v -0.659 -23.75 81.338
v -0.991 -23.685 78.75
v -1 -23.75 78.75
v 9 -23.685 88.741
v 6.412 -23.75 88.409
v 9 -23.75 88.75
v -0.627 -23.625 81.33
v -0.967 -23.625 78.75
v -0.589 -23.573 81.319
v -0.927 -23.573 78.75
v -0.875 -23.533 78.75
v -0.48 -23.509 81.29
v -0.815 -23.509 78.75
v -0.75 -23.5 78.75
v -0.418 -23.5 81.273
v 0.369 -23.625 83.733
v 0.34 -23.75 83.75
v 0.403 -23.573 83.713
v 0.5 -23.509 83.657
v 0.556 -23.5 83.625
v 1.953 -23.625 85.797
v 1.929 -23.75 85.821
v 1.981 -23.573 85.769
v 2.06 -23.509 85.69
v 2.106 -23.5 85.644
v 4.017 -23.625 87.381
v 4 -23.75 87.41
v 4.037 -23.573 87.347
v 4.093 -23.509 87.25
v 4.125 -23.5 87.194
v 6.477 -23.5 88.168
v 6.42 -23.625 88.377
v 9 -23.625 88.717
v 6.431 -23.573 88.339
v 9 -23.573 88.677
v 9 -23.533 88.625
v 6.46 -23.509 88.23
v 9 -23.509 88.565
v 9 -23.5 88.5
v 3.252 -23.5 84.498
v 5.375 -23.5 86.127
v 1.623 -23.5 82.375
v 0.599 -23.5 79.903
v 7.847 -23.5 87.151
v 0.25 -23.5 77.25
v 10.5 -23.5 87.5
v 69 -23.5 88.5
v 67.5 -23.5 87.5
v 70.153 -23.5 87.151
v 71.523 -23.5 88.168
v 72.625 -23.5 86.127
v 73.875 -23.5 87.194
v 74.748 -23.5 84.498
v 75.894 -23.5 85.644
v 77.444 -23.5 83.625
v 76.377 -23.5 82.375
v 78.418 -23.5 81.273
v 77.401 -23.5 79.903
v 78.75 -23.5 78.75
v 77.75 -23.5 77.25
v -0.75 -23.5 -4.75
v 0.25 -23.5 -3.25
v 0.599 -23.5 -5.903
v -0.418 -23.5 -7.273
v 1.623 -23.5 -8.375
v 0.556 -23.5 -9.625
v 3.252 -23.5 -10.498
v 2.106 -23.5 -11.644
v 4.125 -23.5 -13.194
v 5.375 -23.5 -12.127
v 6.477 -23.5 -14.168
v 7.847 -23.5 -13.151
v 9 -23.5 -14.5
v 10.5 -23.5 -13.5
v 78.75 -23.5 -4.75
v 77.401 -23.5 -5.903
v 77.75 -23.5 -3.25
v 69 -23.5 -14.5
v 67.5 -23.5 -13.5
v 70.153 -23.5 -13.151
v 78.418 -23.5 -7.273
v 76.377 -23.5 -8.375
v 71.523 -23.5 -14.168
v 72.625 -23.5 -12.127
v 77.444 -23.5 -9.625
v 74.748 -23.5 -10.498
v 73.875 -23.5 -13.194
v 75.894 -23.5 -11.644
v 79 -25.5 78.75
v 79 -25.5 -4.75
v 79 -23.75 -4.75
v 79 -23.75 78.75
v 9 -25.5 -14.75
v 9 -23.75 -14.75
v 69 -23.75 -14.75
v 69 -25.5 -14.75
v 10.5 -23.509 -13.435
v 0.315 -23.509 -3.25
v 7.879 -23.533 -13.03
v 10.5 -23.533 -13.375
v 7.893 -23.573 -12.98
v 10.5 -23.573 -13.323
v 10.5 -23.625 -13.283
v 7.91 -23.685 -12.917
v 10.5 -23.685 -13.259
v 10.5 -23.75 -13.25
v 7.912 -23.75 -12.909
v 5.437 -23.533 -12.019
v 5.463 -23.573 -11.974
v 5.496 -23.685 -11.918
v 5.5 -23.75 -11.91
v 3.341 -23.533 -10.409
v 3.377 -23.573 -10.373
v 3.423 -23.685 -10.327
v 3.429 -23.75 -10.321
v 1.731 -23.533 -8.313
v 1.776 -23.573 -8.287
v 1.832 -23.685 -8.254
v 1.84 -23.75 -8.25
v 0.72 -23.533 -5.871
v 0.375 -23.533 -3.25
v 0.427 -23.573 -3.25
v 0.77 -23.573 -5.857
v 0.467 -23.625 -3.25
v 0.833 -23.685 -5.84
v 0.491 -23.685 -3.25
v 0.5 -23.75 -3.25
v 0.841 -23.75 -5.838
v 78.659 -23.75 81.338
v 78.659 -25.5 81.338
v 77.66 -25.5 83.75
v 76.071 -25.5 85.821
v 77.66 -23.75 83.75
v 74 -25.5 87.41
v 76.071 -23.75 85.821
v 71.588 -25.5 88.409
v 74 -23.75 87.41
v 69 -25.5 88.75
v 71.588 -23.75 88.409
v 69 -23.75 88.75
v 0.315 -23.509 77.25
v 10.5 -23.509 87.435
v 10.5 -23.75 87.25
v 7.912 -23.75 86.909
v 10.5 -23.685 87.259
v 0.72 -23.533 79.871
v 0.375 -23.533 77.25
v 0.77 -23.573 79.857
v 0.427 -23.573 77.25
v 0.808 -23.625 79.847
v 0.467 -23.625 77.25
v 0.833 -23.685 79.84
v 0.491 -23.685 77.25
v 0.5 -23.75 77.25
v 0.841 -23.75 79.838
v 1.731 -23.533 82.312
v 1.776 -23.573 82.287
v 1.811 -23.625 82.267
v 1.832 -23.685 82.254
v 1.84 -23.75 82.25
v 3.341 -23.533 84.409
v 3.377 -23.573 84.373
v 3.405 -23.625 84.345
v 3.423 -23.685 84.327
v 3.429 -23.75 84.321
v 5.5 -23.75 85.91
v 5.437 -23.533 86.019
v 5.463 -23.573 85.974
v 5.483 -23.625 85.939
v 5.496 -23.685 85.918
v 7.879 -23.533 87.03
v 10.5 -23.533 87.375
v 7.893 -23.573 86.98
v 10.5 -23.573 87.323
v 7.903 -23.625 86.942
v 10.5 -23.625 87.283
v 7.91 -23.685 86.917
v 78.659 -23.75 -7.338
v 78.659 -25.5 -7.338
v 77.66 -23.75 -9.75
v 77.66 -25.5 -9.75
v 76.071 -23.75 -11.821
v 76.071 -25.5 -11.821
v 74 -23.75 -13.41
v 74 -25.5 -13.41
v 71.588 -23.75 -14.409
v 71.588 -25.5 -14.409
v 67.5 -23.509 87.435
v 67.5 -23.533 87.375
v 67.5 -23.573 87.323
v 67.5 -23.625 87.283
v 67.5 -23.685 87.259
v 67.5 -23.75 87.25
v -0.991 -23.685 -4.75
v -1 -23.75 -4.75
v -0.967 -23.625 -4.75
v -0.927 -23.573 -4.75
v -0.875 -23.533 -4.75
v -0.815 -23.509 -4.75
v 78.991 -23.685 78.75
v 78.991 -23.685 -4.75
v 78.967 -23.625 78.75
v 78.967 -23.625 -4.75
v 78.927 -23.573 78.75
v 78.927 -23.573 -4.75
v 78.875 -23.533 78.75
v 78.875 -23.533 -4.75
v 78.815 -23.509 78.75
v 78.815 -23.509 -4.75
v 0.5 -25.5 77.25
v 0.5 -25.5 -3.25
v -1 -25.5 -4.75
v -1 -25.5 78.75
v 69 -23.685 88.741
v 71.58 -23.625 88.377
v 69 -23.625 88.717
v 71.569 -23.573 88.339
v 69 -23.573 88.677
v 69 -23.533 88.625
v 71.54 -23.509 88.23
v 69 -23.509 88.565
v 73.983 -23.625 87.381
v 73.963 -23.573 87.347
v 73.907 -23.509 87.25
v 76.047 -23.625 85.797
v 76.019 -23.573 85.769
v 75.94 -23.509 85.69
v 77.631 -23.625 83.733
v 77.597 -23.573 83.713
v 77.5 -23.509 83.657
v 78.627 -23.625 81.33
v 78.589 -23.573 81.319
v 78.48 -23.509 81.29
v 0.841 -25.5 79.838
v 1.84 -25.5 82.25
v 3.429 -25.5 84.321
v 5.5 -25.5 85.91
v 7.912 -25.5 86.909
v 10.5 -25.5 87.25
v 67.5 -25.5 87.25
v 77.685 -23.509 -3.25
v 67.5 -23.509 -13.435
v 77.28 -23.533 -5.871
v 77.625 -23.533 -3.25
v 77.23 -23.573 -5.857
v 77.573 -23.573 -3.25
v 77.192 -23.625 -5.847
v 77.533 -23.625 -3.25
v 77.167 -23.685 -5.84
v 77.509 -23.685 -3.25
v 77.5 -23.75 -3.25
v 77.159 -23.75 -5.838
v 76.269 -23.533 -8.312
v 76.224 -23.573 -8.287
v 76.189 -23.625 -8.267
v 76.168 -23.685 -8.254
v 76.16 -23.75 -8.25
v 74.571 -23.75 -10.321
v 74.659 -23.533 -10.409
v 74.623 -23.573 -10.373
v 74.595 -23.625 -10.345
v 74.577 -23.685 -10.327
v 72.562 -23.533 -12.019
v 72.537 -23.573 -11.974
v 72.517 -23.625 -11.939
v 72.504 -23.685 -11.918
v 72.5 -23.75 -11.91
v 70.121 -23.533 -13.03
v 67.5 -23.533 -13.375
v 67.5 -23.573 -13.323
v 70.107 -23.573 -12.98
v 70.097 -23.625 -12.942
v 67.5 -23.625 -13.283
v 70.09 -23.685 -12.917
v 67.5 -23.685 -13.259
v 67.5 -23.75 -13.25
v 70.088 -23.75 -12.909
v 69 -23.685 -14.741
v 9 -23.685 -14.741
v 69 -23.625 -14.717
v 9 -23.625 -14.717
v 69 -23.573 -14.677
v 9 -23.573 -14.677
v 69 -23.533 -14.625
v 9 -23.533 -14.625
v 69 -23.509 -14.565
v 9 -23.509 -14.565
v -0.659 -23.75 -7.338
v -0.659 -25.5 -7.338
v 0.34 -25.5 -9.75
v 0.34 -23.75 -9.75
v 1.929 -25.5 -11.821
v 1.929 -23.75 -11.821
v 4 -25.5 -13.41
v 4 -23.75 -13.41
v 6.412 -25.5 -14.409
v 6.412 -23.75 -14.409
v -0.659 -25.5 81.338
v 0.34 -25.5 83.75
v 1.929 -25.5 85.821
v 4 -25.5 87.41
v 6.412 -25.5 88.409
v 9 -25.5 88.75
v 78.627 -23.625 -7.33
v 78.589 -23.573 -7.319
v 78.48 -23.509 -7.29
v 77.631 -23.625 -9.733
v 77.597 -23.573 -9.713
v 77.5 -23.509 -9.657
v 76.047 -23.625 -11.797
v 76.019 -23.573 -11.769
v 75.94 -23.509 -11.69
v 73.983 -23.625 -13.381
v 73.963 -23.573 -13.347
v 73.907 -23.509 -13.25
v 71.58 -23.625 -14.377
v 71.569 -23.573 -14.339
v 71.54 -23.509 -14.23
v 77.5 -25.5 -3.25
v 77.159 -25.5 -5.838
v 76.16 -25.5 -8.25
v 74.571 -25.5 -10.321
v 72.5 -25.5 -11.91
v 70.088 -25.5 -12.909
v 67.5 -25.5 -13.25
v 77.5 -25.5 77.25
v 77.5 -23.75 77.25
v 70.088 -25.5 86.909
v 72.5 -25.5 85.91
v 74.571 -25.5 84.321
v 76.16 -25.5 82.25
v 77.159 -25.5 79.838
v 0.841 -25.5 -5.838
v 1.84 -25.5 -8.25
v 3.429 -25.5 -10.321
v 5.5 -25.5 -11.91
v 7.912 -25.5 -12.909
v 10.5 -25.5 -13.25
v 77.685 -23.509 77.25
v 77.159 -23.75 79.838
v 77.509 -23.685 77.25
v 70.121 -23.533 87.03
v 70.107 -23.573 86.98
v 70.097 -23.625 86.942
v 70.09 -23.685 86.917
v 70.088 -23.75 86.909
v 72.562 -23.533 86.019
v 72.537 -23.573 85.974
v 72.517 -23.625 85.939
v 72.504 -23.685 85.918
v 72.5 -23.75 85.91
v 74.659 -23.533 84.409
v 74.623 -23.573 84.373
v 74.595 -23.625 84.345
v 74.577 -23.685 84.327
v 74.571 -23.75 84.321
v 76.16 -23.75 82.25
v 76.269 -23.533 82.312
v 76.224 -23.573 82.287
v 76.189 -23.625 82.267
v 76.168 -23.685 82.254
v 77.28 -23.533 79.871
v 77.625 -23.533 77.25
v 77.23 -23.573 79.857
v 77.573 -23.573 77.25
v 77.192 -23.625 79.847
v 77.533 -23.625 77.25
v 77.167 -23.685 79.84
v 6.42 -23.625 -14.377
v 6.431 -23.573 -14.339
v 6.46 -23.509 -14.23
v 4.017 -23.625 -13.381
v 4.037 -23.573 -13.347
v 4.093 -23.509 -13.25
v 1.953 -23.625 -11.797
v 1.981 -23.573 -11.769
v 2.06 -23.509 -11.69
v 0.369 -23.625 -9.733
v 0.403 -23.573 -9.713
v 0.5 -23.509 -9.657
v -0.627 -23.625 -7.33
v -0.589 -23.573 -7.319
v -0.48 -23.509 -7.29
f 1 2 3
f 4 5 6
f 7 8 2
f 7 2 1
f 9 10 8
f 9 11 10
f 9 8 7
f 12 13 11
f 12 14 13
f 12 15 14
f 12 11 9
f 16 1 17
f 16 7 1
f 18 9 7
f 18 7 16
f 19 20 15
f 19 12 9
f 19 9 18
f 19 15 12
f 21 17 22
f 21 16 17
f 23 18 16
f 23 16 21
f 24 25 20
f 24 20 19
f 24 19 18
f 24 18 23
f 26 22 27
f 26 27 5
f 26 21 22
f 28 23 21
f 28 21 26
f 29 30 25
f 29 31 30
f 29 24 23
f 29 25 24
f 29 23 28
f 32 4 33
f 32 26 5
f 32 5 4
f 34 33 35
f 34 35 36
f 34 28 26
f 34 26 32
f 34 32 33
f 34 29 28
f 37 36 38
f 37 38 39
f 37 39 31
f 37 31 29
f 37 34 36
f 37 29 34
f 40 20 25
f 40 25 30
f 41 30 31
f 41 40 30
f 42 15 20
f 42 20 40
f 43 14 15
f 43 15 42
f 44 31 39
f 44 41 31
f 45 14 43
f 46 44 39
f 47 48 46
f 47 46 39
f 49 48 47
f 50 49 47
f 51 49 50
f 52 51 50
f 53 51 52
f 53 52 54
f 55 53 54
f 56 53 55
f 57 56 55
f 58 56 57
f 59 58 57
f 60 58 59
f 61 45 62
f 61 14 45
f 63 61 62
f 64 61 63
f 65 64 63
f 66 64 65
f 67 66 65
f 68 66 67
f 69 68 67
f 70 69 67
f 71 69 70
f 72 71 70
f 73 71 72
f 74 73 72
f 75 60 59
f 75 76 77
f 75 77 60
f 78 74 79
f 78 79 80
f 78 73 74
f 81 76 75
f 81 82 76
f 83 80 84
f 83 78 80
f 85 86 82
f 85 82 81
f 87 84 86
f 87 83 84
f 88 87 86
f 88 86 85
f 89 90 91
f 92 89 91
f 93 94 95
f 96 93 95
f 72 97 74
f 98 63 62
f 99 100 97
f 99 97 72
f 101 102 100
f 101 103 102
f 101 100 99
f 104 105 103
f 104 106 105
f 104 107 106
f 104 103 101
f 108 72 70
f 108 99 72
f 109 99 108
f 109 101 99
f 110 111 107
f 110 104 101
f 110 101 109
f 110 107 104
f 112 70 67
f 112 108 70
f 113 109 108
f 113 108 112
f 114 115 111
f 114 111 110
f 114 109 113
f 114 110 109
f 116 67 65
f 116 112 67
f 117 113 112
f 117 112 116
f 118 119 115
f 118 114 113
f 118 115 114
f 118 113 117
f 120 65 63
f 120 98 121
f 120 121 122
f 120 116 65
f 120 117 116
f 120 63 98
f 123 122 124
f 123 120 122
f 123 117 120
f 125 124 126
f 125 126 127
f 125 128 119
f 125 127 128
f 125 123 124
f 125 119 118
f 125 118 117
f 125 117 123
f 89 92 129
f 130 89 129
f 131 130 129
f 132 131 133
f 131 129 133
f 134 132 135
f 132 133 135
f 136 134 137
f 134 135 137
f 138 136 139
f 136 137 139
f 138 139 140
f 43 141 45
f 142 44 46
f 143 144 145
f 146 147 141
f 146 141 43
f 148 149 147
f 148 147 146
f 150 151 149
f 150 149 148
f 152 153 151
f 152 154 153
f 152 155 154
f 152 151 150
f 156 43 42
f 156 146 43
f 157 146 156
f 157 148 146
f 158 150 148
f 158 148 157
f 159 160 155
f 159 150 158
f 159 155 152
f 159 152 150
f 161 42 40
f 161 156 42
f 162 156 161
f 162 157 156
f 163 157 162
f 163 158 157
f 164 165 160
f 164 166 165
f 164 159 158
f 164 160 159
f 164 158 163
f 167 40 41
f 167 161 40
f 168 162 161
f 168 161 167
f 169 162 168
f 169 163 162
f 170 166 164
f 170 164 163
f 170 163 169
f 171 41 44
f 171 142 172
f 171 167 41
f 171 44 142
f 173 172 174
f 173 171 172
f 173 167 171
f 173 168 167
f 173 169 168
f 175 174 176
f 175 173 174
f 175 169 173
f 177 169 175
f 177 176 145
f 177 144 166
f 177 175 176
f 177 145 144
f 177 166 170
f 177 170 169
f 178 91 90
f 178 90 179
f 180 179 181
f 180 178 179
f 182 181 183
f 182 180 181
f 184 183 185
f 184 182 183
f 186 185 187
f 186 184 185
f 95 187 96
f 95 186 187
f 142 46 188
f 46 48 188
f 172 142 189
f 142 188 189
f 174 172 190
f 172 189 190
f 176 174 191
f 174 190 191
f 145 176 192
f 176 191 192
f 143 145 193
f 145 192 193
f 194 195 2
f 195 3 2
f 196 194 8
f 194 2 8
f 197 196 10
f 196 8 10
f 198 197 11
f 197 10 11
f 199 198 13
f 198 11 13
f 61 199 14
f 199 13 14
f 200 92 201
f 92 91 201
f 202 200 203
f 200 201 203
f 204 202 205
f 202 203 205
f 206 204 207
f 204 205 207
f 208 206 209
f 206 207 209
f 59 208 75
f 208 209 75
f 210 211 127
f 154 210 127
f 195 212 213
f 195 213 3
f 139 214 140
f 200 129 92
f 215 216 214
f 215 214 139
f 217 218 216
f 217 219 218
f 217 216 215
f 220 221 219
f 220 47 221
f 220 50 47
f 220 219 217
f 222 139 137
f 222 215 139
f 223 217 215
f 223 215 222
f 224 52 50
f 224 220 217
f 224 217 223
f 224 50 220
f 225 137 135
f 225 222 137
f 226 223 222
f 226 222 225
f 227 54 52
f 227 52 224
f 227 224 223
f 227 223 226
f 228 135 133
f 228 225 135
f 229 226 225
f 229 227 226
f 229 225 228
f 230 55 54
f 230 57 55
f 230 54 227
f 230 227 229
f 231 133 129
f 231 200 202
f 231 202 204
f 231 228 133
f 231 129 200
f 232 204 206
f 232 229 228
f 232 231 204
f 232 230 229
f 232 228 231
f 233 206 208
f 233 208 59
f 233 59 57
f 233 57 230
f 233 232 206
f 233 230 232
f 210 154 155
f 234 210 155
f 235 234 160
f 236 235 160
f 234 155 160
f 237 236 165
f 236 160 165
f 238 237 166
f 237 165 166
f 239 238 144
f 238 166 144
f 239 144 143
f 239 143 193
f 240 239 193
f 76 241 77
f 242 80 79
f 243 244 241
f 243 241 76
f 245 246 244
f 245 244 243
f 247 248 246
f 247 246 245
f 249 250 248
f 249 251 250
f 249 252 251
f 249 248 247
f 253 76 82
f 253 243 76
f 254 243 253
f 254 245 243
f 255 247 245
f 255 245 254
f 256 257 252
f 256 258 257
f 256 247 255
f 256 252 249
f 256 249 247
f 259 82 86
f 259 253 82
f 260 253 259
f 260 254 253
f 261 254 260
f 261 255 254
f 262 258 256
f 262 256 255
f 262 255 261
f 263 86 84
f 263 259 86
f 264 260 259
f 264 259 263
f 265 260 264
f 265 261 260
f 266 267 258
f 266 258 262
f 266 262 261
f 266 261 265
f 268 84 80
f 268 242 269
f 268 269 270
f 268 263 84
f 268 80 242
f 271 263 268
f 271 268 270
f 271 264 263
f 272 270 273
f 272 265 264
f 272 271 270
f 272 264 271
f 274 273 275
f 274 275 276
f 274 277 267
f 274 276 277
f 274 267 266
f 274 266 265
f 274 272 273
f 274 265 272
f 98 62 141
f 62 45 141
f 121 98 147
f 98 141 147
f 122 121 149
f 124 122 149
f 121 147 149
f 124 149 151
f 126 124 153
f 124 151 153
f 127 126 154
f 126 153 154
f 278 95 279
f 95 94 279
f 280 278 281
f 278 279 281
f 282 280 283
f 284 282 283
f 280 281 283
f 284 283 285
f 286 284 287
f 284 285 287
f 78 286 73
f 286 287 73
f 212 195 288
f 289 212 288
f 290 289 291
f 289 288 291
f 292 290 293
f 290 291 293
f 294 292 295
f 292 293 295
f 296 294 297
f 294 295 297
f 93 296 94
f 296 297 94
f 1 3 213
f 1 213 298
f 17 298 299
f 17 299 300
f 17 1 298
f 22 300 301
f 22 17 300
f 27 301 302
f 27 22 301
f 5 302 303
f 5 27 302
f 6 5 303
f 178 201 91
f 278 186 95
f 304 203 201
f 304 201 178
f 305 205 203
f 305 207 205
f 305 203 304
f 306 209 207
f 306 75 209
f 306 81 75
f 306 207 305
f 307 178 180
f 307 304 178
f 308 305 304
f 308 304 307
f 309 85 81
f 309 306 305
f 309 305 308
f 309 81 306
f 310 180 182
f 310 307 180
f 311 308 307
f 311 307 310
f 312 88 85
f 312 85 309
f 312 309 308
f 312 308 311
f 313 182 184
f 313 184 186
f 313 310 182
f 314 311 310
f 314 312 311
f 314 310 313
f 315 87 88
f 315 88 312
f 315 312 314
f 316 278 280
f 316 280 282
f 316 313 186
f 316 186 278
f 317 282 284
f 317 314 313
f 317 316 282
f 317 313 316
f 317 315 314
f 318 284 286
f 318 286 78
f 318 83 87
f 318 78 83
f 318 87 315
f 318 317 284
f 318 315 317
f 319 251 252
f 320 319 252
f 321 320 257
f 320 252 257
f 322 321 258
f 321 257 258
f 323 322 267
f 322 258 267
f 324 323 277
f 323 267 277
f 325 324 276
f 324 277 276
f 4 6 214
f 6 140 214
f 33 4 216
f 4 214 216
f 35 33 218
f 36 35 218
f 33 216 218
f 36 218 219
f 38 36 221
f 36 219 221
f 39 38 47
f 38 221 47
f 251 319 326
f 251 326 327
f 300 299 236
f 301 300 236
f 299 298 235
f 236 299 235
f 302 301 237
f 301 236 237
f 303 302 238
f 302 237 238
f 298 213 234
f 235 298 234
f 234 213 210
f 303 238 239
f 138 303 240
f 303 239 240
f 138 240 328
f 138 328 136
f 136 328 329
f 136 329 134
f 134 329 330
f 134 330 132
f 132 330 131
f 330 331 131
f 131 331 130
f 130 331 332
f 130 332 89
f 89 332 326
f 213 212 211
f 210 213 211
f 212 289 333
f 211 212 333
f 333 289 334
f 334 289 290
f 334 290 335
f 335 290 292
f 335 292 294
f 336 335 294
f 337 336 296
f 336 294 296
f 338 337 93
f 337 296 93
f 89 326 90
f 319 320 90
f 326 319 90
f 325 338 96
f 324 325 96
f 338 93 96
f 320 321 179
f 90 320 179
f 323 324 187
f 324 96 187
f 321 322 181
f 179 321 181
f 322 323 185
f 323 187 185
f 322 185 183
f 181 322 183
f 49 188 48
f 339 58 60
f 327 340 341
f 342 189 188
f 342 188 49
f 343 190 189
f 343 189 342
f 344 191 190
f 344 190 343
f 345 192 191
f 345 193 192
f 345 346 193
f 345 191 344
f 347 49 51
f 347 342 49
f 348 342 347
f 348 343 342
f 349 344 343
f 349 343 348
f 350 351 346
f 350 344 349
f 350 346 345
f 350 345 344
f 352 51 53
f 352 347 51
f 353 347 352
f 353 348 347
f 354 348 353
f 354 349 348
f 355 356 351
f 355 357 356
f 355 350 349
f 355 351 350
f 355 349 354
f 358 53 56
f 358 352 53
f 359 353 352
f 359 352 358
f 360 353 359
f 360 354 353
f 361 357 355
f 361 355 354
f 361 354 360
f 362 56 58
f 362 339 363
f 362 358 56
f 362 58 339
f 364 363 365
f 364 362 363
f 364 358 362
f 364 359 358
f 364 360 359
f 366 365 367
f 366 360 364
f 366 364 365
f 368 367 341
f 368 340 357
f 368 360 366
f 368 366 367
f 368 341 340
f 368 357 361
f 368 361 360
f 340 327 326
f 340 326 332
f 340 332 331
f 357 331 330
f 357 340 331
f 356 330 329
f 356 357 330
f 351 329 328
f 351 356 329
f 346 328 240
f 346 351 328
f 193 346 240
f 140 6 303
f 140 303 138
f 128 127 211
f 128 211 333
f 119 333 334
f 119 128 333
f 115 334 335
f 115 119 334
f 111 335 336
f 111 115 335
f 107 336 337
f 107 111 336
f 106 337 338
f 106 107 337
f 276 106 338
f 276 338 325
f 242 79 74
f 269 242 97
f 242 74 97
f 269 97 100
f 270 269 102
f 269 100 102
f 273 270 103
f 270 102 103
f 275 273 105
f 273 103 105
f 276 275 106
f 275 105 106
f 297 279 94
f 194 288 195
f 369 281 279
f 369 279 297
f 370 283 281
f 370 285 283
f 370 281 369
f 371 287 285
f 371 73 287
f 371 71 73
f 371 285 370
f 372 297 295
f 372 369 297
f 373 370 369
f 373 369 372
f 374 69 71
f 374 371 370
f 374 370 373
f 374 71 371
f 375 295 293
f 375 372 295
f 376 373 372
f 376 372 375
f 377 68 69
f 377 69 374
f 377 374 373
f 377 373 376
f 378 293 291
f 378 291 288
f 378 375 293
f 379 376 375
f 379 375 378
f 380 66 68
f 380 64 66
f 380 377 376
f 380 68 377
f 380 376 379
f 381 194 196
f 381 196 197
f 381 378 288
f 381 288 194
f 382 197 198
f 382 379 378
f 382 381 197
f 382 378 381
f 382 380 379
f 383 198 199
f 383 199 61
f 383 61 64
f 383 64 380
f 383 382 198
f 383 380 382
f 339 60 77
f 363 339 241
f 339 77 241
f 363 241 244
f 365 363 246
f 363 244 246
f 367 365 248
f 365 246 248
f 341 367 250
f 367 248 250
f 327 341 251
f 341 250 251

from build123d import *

# Parameters (mm, degrees)
BOX027_W     = 77
BOX027_H     = 2
BOX027_DEPTH = 100.5
FILLET031_R  = 10
BOX026_W     = 80
BOX026_H     = 2
BOX026_DEPTH = 103.5
FILLET030_R  = 10
FILLET032_R  = 0.25


with BuildPart() as topridge001:
    # Box027 → Box027 (new body)
    with BuildSketch(Plane(origin=(0.5, -26, -13.25), x_dir=(1, 0, 0), z_dir=(0, 0, 1))):
        with Locations((38.5, 1)):
            Rectangle(BOX027_W, BOX027_H)
    extrude(amount=BOX027_DEPTH)

    # Fillet031
    fillet031_edges = [topridge001.edges().sort_by_distance(p)[0] for p in [
        (0.5, -25, 87.25),
        (0.5, -25, -13.25),
        (77.5, -25, 87.25),
        (77.5, -25, -13.25),
    ]]
    fillet(fillet031_edges, radius=FILLET031_R)


with BuildPart() as topridge001_1:
    # Fillet031 placement: moved
    add(topridge001.part.moved(Location((0, 0.5, 0))))


with BuildPart() as ridge:
    # Box026 → Box026 (new body)
    with BuildSketch(Plane(origin=(-1, -26, -14.75), x_dir=(1, 0, 0), z_dir=(0, 0, 1))):
        with Locations((40, 1)):
            Rectangle(BOX026_W, BOX026_H)
    extrude(amount=BOX026_DEPTH)

    # Fillet030
    fillet030_edges = [ridge.edges().sort_by_distance(p)[0] for p in [
        (-1, -25, 88.75),
        (-1, -25, -14.75),
        (79, -25, 88.75),
        (79, -25, -14.75),
    ]]
    fillet(fillet030_edges, radius=FILLET030_R)


with BuildPart() as ridge_1:
    # Fillet030 placement: moved
    add(ridge.part.moved(Location((0, 0.5, 0))))

    # Cut008: cut topRidge001
    add(topridge001_1.part, mode=Mode.SUBTRACT)

    # Fillet032
    fillet032_edges = [ridge_1.edges().sort_by_distance(p)[0] for p in [
        (-1, -23.5, 37),
        (1.928932, -23.5, -11.821068),
        (39, -23.5, -14.75),
        (76.071068, -23.5, -11.821068),
        (79, -23.5, 37),
        (1.928932, -23.5, 85.821068),
        (76.071068, -23.5, 85.821068),
        (39, -23.5, 88.75),
        (0.5, -23.5, 37),
        (3.428932, -23.5, 84.321068),
        (39, -23.5, 87.25),
        (74.571068, -23.5, 84.321068),
        (77.5, -23.5, 37),
        (74.571068, -23.5, -10.321068),
        (39, -23.5, -13.25),
        (3.428932, -23.5, -10.321068),
    ]]
    fillet(fillet032_edges, radius=FILLET032_R)


solid = ridge_1.part
